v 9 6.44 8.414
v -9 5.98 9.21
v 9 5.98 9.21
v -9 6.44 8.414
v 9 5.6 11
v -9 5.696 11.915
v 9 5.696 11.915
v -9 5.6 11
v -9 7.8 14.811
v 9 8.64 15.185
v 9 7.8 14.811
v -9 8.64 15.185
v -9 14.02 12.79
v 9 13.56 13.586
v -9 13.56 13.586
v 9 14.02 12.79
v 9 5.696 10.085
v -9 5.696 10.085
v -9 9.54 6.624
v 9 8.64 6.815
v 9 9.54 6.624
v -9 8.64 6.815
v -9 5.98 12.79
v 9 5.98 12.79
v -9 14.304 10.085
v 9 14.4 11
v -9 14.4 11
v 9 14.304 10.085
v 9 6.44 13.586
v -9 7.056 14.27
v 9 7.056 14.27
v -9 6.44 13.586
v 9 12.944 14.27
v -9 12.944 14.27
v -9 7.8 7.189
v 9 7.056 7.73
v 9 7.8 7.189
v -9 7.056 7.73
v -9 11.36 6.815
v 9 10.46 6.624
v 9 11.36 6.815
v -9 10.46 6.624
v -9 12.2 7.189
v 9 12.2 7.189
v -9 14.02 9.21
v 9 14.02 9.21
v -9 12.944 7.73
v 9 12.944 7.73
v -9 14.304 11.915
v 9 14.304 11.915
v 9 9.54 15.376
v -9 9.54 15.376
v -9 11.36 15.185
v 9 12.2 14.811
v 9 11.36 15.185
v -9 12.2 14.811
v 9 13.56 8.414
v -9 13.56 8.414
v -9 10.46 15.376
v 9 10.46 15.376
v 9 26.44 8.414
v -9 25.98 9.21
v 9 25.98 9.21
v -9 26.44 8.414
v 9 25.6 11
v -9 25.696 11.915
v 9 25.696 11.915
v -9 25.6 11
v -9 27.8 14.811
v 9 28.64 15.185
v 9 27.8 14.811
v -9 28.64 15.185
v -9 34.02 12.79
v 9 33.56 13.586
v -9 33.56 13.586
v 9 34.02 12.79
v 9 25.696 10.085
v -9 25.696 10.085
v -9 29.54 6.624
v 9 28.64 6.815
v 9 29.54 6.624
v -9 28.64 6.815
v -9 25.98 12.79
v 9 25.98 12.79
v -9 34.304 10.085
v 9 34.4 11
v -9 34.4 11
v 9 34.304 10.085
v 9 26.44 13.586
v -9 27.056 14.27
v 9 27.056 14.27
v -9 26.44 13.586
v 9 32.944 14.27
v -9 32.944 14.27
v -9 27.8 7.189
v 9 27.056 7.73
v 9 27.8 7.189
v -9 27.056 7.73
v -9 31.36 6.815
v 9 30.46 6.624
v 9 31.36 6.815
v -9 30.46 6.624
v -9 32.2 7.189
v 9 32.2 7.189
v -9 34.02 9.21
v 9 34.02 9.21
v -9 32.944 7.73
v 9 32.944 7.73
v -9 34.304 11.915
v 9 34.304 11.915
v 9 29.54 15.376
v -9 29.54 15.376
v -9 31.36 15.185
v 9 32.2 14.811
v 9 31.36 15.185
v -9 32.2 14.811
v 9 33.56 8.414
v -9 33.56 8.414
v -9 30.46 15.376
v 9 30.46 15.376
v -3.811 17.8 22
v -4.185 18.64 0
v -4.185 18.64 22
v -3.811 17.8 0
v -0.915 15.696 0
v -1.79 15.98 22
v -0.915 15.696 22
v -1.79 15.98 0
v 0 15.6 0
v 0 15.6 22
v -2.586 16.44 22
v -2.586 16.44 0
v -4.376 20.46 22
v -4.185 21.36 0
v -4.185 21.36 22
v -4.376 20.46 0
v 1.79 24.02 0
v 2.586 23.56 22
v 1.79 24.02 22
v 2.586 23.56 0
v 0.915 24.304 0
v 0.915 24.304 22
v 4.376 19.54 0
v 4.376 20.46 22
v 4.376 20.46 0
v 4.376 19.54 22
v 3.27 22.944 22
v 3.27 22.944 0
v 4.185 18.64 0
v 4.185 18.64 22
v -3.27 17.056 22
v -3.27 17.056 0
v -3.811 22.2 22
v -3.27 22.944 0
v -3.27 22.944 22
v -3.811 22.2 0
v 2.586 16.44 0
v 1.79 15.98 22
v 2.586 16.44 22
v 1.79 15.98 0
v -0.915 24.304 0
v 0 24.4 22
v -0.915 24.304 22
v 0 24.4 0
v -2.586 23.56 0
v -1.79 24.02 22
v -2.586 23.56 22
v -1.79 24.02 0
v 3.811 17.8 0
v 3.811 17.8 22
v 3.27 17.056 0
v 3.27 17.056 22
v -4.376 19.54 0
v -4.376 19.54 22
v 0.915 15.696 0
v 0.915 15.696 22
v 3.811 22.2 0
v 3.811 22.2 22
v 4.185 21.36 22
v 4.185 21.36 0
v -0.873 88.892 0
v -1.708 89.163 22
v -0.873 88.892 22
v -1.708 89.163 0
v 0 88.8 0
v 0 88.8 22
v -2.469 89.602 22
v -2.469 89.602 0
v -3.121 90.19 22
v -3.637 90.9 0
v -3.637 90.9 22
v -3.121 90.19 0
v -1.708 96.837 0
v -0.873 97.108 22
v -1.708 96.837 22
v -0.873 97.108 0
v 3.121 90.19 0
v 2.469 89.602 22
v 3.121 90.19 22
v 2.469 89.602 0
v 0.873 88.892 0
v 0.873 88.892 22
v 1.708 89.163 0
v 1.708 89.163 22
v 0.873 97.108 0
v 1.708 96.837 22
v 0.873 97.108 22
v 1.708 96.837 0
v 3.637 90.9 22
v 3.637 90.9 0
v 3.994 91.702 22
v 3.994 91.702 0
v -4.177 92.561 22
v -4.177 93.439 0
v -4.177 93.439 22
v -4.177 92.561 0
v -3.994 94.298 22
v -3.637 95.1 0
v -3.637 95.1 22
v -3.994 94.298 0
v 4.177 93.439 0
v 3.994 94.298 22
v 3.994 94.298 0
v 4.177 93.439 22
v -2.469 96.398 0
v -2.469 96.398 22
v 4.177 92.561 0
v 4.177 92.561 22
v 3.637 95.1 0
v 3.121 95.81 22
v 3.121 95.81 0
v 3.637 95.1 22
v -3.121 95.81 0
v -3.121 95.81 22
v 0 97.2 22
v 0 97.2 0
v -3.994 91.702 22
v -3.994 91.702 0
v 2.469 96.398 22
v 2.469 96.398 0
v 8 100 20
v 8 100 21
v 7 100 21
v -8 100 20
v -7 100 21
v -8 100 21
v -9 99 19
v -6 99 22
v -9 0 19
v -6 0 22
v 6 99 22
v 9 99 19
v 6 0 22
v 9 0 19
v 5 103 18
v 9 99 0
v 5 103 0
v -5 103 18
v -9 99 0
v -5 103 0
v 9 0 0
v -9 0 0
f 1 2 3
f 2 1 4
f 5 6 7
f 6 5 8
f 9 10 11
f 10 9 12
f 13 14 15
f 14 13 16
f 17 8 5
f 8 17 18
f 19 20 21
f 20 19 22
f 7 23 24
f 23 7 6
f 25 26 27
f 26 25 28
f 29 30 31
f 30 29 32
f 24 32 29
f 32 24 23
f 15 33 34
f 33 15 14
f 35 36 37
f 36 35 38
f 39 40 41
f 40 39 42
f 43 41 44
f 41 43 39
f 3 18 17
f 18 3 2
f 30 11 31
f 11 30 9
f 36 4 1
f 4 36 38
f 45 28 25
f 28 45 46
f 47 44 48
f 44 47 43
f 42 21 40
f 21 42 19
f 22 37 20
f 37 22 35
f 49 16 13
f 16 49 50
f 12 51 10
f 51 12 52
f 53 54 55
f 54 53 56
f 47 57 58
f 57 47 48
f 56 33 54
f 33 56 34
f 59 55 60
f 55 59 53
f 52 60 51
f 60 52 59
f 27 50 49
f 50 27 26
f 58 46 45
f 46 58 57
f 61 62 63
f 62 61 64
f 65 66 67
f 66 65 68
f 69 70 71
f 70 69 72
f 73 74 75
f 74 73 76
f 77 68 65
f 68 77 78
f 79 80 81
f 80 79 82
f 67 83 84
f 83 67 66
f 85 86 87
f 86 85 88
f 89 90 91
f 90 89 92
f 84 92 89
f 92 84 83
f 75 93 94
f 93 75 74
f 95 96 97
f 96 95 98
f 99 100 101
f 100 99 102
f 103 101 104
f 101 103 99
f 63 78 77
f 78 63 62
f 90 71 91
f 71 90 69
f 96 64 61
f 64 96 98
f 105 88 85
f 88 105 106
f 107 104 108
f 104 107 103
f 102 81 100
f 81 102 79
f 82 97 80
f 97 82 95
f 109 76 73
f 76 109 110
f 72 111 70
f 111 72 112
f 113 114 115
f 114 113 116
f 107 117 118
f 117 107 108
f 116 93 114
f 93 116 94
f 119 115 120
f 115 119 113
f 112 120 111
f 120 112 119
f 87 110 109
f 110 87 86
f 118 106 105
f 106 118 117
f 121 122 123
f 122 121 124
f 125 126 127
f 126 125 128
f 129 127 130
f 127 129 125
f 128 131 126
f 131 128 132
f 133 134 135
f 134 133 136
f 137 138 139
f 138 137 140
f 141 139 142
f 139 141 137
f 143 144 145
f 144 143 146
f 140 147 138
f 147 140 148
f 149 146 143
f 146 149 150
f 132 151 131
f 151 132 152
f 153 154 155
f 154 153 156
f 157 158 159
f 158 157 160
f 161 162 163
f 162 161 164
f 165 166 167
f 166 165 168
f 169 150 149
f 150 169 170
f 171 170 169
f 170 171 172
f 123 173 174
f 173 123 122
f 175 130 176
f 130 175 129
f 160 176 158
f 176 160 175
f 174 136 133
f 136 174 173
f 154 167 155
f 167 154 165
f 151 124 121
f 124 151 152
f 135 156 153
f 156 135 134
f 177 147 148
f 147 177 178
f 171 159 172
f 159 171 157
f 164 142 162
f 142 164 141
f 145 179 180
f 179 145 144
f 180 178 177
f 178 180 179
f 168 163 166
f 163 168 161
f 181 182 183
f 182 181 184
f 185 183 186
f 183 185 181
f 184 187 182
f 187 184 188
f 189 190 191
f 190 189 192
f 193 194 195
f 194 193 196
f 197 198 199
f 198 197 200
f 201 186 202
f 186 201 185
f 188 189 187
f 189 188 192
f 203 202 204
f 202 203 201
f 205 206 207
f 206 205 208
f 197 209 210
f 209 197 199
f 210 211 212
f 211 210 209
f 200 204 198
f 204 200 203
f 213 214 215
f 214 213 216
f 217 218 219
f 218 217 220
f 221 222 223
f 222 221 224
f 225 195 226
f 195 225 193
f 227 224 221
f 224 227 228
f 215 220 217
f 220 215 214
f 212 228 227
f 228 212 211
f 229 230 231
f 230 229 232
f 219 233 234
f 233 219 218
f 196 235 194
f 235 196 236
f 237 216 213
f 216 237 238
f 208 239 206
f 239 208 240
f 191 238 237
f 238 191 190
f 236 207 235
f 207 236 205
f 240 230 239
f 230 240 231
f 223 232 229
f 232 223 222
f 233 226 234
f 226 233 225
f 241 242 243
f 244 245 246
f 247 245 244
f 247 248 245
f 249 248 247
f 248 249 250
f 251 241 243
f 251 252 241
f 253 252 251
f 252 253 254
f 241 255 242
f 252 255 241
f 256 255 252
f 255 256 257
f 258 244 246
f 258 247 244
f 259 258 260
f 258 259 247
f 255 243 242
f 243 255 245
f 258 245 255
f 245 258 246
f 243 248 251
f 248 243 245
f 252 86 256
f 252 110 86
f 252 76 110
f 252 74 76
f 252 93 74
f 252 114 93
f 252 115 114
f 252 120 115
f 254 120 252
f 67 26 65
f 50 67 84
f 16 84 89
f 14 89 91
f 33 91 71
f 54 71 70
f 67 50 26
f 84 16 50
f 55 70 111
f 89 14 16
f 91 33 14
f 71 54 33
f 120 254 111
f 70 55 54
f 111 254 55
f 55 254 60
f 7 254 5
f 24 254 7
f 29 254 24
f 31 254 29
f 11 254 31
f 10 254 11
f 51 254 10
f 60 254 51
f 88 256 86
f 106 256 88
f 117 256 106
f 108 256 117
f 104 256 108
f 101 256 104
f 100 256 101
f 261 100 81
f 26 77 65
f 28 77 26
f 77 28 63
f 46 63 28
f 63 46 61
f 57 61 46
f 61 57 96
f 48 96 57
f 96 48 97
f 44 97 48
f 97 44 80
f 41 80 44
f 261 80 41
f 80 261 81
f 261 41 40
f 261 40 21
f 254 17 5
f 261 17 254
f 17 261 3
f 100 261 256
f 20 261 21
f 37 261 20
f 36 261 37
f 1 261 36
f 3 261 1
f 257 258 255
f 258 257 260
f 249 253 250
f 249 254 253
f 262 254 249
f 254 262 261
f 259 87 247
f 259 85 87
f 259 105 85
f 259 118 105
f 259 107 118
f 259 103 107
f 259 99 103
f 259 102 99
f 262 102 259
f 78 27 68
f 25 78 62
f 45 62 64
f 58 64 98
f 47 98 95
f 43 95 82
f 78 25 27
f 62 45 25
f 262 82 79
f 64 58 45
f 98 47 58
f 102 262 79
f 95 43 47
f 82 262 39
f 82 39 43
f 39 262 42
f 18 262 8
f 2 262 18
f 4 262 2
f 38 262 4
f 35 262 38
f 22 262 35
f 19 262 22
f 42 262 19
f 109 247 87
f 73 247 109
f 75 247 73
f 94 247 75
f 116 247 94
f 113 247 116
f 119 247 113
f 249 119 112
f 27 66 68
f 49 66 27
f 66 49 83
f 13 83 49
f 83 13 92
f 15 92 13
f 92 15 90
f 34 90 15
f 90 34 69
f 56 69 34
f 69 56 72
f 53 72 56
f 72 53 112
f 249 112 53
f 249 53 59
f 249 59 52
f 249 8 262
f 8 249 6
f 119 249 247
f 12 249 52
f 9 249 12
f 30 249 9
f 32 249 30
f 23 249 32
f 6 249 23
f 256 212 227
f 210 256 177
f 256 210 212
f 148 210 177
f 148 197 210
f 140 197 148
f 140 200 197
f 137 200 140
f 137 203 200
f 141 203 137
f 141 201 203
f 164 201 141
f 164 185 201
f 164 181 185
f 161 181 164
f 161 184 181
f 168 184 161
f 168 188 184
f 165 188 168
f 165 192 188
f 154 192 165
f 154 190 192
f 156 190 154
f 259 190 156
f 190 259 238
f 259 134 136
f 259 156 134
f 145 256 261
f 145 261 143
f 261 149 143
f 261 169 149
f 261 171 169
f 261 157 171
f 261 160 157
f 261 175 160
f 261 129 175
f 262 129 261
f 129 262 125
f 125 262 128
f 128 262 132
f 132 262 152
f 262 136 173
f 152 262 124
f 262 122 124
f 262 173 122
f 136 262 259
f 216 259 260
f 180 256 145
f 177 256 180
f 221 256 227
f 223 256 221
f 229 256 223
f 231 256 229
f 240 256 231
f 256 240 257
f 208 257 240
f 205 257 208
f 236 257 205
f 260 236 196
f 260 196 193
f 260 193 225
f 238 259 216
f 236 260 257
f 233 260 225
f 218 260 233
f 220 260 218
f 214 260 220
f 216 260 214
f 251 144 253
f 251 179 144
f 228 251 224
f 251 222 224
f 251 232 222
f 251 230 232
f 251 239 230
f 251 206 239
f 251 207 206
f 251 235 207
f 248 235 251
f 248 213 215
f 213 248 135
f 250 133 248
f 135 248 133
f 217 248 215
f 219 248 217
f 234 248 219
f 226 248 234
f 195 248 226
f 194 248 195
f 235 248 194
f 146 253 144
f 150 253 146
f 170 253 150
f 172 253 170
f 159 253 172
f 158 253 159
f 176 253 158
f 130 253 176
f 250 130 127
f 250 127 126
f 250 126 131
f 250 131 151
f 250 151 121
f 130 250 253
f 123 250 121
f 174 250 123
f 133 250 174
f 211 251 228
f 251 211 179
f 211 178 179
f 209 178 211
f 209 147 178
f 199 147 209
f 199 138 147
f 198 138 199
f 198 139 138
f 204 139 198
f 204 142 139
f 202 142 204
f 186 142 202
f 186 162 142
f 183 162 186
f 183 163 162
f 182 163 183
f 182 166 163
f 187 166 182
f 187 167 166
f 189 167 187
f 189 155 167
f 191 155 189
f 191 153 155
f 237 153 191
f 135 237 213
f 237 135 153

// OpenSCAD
// Open Exposer 3D Printer Extension
// Z motor mount
// GNU GPL v3
// Mario Lukas <info@mariolukas.de>
// http://www.mariolukas.de
// http://www.openexposer.com

corner_out();
// Final part
module corner_out(){
 // Rotate the part for better printing
 translate([0,0,11]) rotate([-90,0,0]) difference(){
  corner_base_out();
  corner_holes_out();
  corner_fancy_out();
 }
}


module corner_back(){
 // Rotate the part for better printing
 translate([0,0,11]) rotate([-90,0,0]) difference(){
  corner_back_base();
  corner_back_holes()
  corner_fancy();
 }
}


module corner_base_out(){	
 translate([-9,-11,0])cube([18,22,103]);
}

module corner_base(){	
 translate([-9,-11,0])cube([18,22,47]);
}

module corner_back_base(){	
 translate([-9,-29,0])cube([18,40,47]);
}



module corner_back_holes(){
 translate([-11,-11,0]){
  // Bottom hole
  translate([0,11,10]) rotate([0,90,0]) translate([0,0,-5]) cylinder(h = 270, r=4.4, $fn=30);
  // Top hole
  translate([0,11,30]) rotate([0,90,0]) translate([0,0,-5]) cylinder(h = 270, r=4.4, $fn=30);
  // Middle hole
  //translate([11,0,20]) rotate([0,0,90]) rotate([0,90,0]) translate([0,0,-5]) cylinder(h = 270, r=4.4, $fn=30);

  // Washer hole
//  translate([11,-3,20]) rotate([0,0,90]) rotate([0,90,0]) translate([0,0,-5]) cylinder(h = 10, r=11, $fn=30);
  translate([11,-8,5])  cylinder(h = 270, r=4.2, $fn=30);
  // Top smooth rod insert
  // Smooth rod place
  // translate([11,2,45]) rotate([0,90,90]) cylinder(h = 270, r=4.2, $fn=30);
  // Mod for 10mm bar
  translate([11,2,45]) rotate([0,90,90]) cylinder(h = 270, r=4.2, $fn=30); 
  // Ziptie
  translate([-5,10,37]) cube([30,3.5,2]);
  translate([-5,10,37]) rotate([45,0,0]) cube([30,1.42,1.42]);
 }
}

module corner_fancy_out(){
 // Side corner cutouts
  translate([-8,-9,0]) rotate([0,0,-45-180]) translate([-15,0,-1]) cube([30,30,101]);
  translate([8,-9,0]) rotate([0,0,45-180]) translate([-15,0,-1]) cube([30,30,101]);
 // Top corner cutouts
 translate([7,0,101]) rotate([0,45,0]) translate([-15,-15,0]) cube([30,30,30]);
  translate([-7,0,101]) rotate([0,-45,0]) translate([-15,-15,0]) cube([30,30,30]);
  rotate([0,0,90]){
   translate([-9,0,101]) rotate([0,-45,0]) translate([-15,-15,0]) cube([30,30,30]);
  }
}

module corner_holes_out(){
 translate([-11,-11,0]){
  // Bottom hole
  translate([0,11,10]) rotate([0,90,0]) translate([0,0,-5]) cylinder(h = 270, r=4.4, $fn=30);
  // Top hole
  translate([0,11,30]) rotate([0,90,0]) translate([0,0,-5]) cylinder(h = 270, r=4.4, $fn=30);
  // Middle hole
  translate([11,0,20]) rotate([0,0,90]) rotate([0,90,0]) translate([0,0,-5]) cylinder(h = 270, r=4.4, $fn=30);

  translate([11,-20,93]) rotate([0,90,90]) cylinder(h = 270, r=4.2, $fn=30); 
 }
}




module corner_holes(){
 translate([-11,-11,0]){
  // Bottom hole
  translate([0,11,10]) rotate([0,90,0]) translate([0,0,-5]) cylinder(h = 270, r=4.4, $fn=30);
  // Top hole
  translate([0,11,30]) rotate([0,90,0]) translate([0,0,-5]) cylinder(h = 270, r=4.4, $fn=30);
  // Middle hole
  translate([11,0,20]) rotate([0,0,90]) rotate([0,90,0]) translate([0,0,-5]) cylinder(h = 270, r=4.4, $fn=30);

  // Washer hole
  translate([11,-3,20]) rotate([0,0,90]) rotate([0,90,0]) translate([0,0,-5]) cylinder(h = 10, r=11, $fn=30);

  // Top smooth rod insert
  // Smooth rod place
  // translate([11,2,45]) rotate([0,90,90]) cylinder(h = 270, r=4.2, $fn=30);
  // Mod for 10mm bar
  translate([11,2,45]) rotate([0,90,90]) cylinder(h = 270, r=4.2, $fn=30); 
  // Ziptie
  translate([-5,10,37]) cube([30,3.5,2]);
  translate([-5,10,37]) rotate([45,0,0]) cube([30,1.42,1.42]);
 }
}

module corner_fancy(){
 // Side corner cutouts
  translate([-8,-9,0]) rotate([0,0,-45-180]) translate([-15,0,-1]) cube([30,30,51]);
  translate([8,-9,0]) rotate([0,0,45-180]) translate([-15,0,-1]) cube([30,30,51]);
 // Top corner cutouts
  translate([7,0,49-2]) rotate([0,45,0]) translate([-15,-15,0]) cube([30,30,30]);
  translate([-7,0,49-2]) rotate([0,-45,0]) translate([-15,-15,0]) cube([30,30,30]);
  rotate([0,0,90]){
   translate([-9,0,49-2]) rotate([0,-45,0]) translate([-15,-15,0]) cube([30,30,30]);
  }
}


// Final part
module corner(){
 // Rotate the part for better printing
 translate([0,0,11]) rotate([-90,0,0]) difference(){
  corner_base();
  corner_holes();
  corner_fancy();
 }
}
